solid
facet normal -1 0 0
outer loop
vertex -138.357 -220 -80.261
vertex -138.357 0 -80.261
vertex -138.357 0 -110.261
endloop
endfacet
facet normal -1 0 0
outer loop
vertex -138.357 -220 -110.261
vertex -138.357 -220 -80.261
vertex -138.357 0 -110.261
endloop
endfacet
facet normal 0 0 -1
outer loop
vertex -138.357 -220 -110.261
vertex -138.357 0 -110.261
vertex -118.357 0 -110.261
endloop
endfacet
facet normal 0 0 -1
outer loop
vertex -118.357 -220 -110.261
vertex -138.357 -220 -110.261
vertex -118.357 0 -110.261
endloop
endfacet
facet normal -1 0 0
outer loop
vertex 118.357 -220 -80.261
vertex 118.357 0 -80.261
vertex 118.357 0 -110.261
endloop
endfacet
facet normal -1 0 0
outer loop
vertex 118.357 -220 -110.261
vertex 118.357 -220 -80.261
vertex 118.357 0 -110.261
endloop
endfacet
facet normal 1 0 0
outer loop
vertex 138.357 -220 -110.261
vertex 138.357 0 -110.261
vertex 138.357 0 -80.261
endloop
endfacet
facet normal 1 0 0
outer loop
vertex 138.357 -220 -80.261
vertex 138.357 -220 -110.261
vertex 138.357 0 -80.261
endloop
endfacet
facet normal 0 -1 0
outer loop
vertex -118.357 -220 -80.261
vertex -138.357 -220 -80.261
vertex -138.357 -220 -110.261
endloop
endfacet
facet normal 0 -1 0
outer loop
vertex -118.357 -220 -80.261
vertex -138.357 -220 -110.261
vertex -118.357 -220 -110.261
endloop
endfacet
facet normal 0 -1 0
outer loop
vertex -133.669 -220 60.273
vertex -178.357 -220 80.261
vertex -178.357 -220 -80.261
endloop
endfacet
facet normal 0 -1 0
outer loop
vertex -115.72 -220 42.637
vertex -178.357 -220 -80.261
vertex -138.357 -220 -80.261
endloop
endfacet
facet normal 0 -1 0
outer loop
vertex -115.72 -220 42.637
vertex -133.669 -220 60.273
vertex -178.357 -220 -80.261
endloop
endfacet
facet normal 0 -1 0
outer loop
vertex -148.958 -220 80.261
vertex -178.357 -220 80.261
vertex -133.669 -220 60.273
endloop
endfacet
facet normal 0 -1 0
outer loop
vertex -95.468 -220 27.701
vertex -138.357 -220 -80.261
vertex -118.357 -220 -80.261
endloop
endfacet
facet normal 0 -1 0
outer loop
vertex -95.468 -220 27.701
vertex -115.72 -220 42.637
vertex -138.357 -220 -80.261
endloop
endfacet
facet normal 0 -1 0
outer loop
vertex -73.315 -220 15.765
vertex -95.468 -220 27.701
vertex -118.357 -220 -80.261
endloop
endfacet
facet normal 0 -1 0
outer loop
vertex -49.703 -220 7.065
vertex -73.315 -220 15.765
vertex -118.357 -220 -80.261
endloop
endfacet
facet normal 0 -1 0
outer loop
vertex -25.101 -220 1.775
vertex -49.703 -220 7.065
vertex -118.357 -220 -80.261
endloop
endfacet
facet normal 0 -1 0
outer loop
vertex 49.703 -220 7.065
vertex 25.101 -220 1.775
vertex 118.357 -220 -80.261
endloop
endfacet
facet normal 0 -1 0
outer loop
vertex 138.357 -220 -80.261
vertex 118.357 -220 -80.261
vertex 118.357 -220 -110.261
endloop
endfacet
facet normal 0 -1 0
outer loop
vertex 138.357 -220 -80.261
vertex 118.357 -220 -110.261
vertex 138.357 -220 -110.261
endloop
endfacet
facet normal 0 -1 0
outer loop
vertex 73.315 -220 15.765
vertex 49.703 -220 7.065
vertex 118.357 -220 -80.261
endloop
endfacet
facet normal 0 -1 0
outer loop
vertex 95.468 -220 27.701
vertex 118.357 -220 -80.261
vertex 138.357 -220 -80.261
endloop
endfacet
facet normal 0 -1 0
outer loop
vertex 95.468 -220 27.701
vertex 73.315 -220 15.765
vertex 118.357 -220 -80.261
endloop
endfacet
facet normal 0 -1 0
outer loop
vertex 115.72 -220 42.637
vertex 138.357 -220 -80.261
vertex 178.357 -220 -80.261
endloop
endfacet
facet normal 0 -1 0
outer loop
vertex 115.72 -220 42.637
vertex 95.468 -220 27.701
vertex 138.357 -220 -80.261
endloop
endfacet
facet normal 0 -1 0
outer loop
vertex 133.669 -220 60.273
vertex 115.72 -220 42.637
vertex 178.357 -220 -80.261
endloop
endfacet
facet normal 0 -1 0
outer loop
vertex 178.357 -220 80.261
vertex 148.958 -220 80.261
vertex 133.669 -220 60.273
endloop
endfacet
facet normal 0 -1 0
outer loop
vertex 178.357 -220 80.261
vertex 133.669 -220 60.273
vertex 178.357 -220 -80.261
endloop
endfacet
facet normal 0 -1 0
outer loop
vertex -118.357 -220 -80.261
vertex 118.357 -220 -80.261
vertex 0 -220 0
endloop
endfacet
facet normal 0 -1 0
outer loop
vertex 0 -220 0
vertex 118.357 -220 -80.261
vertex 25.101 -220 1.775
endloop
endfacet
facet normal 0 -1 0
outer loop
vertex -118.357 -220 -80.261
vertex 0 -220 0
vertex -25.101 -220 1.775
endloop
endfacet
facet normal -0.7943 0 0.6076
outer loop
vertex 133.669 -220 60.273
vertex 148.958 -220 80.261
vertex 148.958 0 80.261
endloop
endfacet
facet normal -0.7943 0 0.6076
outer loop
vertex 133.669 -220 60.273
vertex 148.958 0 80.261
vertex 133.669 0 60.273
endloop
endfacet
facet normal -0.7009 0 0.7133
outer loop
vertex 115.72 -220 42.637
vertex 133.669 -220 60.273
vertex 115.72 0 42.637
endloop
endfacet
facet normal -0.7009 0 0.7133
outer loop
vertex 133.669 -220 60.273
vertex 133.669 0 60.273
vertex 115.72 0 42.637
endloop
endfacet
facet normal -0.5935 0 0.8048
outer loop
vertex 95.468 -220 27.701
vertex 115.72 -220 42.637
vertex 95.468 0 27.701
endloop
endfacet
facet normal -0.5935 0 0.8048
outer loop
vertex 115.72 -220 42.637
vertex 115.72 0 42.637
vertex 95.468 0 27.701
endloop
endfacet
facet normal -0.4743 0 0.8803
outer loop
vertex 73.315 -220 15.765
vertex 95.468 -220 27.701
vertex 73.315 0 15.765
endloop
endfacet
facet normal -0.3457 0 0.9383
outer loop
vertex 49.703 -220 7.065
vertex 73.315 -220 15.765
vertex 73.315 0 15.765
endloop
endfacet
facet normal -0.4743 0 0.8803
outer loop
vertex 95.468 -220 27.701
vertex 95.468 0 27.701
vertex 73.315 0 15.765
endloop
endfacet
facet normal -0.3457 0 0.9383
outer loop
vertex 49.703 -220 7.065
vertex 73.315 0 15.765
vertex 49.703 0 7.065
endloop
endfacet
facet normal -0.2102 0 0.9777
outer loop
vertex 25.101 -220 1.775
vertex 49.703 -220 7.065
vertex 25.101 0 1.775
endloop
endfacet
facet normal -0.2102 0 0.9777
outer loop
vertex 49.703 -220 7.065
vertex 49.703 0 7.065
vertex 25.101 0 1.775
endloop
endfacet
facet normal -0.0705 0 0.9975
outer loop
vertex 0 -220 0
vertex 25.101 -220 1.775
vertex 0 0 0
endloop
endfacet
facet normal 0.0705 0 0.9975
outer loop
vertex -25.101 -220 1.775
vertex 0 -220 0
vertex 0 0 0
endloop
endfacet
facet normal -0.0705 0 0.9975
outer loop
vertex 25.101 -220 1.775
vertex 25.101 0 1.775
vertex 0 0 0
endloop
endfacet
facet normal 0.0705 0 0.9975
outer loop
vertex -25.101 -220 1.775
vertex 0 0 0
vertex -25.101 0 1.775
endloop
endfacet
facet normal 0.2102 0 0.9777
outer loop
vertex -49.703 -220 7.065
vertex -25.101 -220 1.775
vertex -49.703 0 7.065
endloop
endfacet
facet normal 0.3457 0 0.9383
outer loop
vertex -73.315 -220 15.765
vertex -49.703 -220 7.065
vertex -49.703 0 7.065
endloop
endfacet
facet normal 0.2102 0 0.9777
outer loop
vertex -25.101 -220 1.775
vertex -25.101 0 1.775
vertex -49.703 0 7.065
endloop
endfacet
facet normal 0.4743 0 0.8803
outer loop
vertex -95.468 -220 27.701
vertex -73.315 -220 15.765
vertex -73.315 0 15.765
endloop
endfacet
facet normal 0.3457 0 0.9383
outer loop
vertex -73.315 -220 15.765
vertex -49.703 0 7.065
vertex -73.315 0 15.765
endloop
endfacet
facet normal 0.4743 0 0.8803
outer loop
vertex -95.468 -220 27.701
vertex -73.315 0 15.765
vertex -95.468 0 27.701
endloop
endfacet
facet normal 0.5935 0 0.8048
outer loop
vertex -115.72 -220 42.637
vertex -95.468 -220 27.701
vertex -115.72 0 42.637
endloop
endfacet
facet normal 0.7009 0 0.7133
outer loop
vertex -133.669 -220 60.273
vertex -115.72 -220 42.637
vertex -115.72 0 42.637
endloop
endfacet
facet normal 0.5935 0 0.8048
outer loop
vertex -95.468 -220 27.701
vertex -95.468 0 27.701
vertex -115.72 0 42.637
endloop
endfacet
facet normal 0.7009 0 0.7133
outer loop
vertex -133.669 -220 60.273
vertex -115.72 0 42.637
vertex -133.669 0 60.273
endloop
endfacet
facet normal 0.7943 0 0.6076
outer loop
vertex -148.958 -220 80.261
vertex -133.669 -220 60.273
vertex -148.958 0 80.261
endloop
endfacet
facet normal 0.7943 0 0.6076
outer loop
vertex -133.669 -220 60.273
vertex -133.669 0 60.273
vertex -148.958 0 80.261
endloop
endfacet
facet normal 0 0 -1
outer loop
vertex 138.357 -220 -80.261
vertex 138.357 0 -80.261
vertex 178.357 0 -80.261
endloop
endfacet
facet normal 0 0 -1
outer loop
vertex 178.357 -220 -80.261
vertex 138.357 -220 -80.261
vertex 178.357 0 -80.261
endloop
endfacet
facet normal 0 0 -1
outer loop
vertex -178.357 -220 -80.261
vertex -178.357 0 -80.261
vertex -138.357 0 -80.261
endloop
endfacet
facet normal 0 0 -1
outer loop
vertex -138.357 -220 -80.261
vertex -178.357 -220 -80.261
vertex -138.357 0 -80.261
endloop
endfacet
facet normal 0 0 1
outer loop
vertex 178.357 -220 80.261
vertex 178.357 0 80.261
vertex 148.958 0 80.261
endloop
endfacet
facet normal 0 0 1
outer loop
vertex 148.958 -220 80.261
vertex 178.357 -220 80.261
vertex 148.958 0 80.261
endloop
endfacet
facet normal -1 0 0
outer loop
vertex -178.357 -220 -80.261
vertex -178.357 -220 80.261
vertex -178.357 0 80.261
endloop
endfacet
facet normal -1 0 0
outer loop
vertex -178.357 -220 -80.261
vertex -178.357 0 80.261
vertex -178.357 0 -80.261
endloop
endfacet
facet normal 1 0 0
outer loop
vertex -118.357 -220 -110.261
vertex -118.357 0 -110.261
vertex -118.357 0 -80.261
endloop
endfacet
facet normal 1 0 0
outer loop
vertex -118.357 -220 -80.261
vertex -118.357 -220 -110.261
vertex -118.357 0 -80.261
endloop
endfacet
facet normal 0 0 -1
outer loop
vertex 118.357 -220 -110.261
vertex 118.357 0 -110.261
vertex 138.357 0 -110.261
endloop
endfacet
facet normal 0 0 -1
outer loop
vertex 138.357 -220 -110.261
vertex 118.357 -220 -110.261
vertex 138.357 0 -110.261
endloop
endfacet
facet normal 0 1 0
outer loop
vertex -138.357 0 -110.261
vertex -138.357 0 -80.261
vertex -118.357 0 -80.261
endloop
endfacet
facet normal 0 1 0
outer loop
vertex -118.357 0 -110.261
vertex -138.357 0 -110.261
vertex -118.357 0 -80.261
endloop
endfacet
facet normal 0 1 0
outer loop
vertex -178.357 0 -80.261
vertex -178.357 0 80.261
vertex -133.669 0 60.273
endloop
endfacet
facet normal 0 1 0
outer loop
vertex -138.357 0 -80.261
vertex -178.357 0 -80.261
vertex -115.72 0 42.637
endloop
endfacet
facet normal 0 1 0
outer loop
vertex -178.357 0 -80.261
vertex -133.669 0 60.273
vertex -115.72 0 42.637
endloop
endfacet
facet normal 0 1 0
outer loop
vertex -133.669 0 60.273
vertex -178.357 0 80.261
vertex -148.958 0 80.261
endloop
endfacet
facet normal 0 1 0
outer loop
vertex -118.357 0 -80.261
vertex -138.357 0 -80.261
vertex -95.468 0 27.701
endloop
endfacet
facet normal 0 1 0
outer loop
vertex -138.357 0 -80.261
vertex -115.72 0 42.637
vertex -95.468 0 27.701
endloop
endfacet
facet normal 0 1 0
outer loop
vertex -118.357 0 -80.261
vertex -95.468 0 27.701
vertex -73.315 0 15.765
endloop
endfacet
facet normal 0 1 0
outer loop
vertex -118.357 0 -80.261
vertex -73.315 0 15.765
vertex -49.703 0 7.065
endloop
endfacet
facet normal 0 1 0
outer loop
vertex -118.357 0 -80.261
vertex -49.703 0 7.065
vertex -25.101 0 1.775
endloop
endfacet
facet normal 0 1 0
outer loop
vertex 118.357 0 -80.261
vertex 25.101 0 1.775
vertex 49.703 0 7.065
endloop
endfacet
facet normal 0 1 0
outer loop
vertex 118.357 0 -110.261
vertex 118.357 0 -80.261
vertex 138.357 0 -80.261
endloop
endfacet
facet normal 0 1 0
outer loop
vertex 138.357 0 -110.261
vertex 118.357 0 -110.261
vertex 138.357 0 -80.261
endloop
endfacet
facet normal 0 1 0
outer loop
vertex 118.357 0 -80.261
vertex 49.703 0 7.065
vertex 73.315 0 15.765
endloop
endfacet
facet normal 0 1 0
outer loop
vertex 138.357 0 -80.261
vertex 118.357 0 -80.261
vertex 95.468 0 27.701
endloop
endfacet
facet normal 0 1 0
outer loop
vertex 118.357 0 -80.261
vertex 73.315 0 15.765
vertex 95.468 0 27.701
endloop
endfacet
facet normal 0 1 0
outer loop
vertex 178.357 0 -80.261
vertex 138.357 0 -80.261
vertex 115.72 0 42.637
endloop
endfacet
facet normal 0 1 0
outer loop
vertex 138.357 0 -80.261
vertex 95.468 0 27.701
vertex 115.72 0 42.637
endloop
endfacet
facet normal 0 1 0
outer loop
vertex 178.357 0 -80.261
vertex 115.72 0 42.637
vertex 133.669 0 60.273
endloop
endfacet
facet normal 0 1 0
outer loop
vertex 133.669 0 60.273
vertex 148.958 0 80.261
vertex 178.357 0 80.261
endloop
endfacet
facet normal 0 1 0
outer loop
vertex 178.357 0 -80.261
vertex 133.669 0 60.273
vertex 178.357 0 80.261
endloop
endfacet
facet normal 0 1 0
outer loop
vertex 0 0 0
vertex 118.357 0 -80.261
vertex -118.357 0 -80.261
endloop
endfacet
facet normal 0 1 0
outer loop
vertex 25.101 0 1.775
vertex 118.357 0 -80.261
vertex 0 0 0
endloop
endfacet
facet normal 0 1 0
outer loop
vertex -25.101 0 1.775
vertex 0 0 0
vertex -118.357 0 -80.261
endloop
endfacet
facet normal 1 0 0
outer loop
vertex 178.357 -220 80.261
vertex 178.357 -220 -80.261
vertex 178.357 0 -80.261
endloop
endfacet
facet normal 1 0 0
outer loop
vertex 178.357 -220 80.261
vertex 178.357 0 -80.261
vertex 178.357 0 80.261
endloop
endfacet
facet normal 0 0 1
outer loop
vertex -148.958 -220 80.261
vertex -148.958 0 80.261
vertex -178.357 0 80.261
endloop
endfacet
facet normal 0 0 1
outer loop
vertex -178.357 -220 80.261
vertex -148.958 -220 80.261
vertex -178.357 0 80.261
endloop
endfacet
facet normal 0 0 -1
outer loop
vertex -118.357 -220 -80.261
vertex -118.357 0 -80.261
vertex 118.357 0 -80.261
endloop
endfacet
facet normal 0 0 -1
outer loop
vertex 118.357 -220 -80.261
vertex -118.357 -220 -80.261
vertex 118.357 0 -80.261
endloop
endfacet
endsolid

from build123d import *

# Parameters (mm, degrees)
F1_DEPTH = 220


# Not quite as in the source:
# - the program builds the solid bodies; features that only make, move or delete a surface that nothing else refers to are left out


with BuildPart() as f1:
    # F0 (on Front) → F1 (new body)
    with BuildSketch(Plane.XZ):
        with BuildLine():
            Line((-178.3572353468, 80.260755906), (-178.3572353468, -80.260755906))
            Line((-178.3572353468, -80.260755906), (-138.3572353468, -80.260755906))
            Line((-138.3572353468, -80.260755906), (-138.3572353468, -110.260755906))
            Line((-138.3572353468, -110.260755906), (-118.3572353468, -110.260755906))
            Line((-118.3572353468, -110.260755906), (-118.3572353468, -80.260755906))
            Line((-118.3572353468, -80.260755906), (118.3572353468, -80.260755906))
            Line((118.3572353468, -80.260755906), (118.3572353468, -110.260755906))
            Line((118.3572353468, -110.260755906), (138.3572353468, -110.260755906))
            Line((138.3572353468, -110.260755906), (138.3572353468, -80.260755906))
            Line((138.3572353468, -80.260755906), (178.3572353468, -80.260755906))
            Line((178.3572353468, -80.260755906), (178.3572353468, 80.260755906))
            Line((178.3572353468, 80.260755906), (148.9576588225, 80.260755906))
            ThreePointArc((148.9576588225, 80.260755906), (0, 0), (-148.9576588225, 80.260755906))
            Line((-148.9576588225, 80.260755906), (-178.3572353468, 80.260755906))
        make_face()
    extrude(amount=F1_DEPTH)


solid = f1.part
